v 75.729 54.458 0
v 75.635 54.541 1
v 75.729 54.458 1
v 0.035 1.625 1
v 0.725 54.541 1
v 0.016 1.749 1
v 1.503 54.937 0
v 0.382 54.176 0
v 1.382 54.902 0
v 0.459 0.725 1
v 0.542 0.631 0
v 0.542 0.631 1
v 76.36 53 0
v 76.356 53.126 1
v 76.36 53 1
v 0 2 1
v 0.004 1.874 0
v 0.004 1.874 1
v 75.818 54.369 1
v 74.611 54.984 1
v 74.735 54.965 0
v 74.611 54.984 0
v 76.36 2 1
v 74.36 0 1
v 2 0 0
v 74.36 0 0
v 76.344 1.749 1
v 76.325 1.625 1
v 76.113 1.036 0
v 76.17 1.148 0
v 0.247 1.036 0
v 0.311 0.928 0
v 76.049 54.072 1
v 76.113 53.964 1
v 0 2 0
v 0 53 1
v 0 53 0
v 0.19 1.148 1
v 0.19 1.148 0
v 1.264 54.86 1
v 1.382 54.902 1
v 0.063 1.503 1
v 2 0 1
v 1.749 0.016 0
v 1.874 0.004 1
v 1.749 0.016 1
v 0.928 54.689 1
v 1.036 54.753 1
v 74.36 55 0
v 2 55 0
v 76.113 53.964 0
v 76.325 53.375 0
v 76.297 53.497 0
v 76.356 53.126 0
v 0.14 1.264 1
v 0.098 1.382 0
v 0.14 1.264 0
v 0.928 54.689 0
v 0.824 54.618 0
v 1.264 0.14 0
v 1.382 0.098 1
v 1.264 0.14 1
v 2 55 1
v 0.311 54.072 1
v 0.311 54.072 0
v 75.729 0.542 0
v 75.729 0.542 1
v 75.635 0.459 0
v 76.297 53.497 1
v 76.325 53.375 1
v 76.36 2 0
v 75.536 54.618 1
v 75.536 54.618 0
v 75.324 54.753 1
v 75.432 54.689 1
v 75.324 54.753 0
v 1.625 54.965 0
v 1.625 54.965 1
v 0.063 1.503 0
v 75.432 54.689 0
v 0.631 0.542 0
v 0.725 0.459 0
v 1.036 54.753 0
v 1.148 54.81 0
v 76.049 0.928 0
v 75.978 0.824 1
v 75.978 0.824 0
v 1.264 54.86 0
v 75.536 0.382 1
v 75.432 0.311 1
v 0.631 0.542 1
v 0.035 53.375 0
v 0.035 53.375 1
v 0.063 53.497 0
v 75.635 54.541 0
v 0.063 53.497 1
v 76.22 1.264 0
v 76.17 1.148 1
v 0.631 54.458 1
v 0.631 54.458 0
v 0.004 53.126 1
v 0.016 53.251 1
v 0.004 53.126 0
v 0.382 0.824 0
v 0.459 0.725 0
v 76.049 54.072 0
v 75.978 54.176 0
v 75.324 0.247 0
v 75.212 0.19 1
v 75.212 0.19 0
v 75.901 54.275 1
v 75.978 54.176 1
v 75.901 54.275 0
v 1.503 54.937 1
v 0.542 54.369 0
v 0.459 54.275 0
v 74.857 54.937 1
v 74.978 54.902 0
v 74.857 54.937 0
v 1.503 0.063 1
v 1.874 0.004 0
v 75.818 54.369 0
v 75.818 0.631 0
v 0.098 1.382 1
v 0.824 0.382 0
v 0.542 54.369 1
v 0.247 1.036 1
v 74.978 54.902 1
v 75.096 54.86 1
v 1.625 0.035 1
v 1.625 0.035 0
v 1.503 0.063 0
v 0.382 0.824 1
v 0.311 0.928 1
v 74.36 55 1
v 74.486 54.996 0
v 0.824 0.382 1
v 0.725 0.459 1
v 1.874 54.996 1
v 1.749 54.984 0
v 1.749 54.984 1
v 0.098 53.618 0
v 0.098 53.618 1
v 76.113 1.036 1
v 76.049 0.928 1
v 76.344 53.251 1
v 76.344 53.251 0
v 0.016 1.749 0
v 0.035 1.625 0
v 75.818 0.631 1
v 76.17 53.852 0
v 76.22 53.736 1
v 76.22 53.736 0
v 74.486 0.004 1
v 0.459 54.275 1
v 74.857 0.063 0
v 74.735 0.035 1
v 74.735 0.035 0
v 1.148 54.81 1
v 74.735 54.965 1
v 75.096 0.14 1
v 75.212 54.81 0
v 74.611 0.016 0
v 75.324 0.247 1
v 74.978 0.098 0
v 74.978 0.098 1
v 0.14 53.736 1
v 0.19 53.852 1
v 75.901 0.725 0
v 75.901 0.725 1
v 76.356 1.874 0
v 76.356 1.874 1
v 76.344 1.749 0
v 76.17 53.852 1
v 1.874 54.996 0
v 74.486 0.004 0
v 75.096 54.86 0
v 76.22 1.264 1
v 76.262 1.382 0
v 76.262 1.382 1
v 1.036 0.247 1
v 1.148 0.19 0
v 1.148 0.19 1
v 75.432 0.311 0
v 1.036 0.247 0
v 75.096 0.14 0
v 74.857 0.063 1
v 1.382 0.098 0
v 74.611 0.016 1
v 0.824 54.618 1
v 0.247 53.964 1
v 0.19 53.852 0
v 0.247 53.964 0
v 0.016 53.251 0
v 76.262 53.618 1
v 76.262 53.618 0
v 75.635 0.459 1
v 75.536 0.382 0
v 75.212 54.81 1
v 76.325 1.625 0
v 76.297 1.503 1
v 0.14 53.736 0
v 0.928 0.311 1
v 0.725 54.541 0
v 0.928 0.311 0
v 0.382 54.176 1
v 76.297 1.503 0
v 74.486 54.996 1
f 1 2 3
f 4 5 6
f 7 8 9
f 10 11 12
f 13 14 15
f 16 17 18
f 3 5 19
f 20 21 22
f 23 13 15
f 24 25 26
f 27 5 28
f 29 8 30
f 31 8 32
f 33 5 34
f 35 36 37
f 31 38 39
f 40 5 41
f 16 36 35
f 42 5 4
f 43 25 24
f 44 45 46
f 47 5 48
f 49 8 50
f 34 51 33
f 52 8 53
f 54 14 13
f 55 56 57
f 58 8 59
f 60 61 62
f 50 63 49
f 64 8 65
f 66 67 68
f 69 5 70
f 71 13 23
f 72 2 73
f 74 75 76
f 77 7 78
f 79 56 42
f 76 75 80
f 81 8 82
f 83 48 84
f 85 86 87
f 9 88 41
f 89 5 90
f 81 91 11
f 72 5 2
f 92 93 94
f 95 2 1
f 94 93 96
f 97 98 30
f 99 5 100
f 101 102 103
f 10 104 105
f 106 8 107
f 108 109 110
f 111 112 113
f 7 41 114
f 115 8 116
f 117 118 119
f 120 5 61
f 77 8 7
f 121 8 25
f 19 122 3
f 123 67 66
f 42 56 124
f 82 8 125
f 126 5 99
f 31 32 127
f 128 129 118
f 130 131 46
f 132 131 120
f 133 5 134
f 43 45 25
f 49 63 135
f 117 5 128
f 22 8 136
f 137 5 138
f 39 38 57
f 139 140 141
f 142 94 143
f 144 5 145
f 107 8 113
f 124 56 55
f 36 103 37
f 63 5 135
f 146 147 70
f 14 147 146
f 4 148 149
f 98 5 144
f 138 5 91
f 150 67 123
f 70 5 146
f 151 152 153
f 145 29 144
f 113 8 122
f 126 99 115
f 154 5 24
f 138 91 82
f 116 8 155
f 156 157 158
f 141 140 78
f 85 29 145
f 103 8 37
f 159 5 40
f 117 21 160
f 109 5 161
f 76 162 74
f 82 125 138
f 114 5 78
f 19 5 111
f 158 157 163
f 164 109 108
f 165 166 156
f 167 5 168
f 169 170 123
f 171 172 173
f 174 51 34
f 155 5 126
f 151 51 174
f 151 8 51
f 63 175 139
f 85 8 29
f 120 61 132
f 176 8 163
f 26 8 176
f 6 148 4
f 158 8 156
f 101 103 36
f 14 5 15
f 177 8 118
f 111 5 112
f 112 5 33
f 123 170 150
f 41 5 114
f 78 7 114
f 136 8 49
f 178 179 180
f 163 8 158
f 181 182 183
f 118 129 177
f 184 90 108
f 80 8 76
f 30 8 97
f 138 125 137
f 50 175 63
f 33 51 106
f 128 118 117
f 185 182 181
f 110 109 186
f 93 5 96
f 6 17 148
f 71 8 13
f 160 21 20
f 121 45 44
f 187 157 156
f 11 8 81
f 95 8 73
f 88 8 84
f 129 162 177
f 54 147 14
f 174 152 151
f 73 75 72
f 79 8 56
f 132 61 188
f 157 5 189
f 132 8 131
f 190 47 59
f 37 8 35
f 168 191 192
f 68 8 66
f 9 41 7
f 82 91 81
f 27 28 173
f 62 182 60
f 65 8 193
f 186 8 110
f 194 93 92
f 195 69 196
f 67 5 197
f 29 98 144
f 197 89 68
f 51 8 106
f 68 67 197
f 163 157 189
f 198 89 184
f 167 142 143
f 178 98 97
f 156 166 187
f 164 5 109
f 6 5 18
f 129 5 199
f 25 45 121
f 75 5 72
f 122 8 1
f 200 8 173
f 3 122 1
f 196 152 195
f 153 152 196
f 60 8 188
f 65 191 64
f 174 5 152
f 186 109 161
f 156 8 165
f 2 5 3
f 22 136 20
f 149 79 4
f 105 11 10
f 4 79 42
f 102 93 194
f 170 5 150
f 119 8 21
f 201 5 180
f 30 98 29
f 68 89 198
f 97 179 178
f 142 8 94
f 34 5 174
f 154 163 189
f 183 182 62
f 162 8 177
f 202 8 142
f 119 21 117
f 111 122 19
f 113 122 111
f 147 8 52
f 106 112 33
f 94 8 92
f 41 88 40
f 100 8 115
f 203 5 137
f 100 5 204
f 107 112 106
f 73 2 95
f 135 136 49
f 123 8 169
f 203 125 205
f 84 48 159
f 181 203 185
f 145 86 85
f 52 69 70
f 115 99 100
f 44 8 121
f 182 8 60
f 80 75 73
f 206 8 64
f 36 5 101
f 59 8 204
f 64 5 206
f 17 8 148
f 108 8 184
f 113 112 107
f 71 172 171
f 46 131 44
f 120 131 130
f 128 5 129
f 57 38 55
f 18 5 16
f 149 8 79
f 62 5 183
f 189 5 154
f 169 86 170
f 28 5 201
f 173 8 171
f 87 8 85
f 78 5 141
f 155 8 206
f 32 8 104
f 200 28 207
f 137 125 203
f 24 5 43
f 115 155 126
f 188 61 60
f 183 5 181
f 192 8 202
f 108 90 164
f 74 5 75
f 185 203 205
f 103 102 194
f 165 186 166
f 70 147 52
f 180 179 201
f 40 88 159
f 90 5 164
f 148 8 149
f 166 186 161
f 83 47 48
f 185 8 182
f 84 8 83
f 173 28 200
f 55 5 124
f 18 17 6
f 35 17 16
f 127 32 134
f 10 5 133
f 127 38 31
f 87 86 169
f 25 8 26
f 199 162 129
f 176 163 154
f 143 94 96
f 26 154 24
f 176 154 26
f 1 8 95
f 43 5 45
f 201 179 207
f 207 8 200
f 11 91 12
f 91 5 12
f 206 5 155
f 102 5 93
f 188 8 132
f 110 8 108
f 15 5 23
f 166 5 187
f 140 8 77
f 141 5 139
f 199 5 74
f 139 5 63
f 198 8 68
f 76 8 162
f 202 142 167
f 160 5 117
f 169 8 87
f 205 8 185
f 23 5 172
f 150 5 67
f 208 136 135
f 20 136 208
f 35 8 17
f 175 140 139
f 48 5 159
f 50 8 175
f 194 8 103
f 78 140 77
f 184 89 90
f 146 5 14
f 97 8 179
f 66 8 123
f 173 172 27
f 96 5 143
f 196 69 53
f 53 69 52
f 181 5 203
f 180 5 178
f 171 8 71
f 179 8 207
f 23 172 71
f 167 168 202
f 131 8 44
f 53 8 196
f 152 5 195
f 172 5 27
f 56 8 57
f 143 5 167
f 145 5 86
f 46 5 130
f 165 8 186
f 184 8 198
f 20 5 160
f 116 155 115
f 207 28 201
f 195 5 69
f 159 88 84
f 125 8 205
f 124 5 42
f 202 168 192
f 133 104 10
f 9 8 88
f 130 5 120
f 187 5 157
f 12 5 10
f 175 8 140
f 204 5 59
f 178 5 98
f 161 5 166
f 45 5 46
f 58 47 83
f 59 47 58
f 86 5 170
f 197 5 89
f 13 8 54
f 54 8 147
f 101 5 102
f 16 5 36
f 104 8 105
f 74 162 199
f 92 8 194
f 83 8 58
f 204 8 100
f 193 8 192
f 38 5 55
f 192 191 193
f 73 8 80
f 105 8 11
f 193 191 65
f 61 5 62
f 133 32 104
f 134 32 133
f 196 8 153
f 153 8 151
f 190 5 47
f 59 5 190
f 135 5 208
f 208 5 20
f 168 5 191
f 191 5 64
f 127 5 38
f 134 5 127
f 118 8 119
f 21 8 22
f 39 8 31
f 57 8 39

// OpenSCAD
$fn=100;
roundedcube(76.36,55,1,2);

module roundedcube(xdim ,ydim ,zdim,rdim){
    hull(){
        translate([rdim,rdim,0]){
            cylinder(h=zdim,r=rdim);
        }
        translate([xdim-rdim,rdim,0]){
            cylinder(h=zdim,r=rdim);
        }
        translate([rdim,ydim-rdim,0]){
            cylinder(h=zdim,r=rdim);
        }
        translate([xdim-rdim,ydim-rdim,0]){
            cylinder(h=zdim,r=rdim);
        }
    }
}
